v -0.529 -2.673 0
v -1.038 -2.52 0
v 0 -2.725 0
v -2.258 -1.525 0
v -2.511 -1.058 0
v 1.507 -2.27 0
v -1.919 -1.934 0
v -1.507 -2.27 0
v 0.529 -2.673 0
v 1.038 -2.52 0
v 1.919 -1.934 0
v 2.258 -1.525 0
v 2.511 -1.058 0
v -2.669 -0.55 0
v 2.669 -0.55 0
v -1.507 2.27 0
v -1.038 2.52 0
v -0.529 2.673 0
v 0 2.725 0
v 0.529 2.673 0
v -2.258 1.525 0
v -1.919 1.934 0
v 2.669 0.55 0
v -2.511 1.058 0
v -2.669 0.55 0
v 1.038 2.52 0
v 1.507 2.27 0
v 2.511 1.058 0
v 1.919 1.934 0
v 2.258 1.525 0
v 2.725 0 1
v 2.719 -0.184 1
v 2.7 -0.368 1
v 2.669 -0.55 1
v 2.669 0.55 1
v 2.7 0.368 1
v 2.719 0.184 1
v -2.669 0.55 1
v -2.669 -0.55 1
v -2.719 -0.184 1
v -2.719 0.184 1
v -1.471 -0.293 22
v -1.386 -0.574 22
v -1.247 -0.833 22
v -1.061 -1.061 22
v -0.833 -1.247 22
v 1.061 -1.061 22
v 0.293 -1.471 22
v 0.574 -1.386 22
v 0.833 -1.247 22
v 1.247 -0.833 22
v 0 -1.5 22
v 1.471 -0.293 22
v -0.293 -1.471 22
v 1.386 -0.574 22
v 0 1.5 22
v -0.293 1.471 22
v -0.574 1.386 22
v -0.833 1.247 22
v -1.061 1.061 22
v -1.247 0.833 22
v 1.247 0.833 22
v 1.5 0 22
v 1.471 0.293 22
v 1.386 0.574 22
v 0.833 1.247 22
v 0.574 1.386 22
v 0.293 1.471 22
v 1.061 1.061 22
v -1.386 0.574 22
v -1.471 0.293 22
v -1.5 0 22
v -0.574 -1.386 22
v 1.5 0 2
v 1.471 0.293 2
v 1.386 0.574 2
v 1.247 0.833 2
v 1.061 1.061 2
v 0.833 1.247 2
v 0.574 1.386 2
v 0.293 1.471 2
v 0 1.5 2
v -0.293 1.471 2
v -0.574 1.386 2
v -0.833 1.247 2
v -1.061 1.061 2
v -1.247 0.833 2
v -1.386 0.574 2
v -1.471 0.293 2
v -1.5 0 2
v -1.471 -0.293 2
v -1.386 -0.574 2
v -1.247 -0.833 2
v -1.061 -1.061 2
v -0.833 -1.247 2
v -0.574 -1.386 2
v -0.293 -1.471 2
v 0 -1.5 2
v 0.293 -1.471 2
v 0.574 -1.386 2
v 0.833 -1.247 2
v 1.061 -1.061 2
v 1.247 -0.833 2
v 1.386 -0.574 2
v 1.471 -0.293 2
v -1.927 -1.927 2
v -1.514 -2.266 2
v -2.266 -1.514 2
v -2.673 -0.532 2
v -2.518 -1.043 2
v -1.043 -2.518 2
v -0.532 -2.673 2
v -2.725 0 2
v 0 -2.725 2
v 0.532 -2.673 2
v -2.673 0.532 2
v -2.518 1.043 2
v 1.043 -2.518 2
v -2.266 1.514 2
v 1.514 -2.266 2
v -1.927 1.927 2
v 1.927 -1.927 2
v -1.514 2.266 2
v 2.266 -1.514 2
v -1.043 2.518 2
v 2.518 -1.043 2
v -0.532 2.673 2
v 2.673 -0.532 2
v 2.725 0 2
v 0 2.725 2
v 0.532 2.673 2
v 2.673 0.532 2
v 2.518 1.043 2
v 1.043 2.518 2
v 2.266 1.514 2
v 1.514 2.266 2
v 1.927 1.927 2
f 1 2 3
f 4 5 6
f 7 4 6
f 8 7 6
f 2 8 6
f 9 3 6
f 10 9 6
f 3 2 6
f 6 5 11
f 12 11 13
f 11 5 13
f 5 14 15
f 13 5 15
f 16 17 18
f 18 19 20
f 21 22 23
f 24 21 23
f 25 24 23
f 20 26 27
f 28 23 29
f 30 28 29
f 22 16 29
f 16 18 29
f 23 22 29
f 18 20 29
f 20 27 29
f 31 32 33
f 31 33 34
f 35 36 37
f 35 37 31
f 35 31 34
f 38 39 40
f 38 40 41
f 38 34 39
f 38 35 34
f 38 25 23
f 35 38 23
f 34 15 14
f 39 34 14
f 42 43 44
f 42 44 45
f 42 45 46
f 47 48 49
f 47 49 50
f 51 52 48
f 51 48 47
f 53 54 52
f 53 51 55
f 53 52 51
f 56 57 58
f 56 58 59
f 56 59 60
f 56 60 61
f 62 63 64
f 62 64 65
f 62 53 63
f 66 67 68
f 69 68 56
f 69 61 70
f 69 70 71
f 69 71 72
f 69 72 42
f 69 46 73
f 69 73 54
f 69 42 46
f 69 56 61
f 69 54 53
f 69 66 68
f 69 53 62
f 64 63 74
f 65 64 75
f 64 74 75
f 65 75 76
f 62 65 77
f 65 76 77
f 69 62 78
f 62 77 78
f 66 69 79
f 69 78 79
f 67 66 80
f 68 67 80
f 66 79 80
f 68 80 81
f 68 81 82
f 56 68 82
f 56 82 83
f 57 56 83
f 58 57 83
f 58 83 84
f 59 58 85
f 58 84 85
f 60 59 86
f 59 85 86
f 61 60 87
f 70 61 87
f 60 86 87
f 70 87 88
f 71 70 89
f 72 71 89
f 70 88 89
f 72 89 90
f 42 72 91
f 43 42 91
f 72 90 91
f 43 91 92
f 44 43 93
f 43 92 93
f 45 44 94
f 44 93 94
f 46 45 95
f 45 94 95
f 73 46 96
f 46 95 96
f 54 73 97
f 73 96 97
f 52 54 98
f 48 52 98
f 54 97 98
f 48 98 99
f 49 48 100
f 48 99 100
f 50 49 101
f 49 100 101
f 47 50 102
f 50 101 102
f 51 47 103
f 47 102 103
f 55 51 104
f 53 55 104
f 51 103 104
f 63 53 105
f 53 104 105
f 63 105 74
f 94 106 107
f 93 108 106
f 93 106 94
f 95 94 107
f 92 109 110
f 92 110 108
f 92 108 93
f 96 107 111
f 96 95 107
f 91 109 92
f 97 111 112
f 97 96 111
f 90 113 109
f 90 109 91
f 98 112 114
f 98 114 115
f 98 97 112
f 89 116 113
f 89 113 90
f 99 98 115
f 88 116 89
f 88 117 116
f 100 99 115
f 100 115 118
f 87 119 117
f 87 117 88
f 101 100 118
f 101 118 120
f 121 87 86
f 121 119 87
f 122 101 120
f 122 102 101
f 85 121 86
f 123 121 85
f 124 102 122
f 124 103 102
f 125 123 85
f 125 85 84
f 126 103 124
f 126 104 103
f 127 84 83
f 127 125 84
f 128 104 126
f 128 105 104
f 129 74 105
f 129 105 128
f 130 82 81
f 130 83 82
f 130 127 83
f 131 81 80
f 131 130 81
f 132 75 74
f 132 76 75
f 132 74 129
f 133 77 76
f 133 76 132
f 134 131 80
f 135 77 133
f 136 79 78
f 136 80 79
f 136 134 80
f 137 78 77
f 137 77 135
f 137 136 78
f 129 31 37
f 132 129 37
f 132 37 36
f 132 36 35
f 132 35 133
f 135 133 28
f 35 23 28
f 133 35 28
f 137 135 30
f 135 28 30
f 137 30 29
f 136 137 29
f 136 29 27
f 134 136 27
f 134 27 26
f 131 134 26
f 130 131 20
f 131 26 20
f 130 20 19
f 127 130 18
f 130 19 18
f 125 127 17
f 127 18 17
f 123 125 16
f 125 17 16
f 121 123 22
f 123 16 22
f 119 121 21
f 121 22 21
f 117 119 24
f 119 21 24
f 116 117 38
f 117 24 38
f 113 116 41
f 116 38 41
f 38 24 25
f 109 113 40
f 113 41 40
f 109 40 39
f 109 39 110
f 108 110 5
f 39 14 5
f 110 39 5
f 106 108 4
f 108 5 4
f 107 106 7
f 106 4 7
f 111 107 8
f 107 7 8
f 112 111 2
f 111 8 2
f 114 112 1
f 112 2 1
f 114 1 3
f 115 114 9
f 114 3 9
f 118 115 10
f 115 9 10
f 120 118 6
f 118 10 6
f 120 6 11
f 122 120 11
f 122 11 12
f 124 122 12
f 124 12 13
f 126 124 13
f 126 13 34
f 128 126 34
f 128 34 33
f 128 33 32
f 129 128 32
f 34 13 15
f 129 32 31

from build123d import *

# Parameters (mm, degrees)
SKETCH1_R          = 2.725
EXTRUDE1_DEPTH     = 2
CUT_EXTRUDE1_DEPTH = 1
SKETCH3_R          = 1.5
EXTRUDE2_DEPTH     = 20


with BuildPart() as part:
    # Sketch1 → Extrude1 (new body)
    with BuildSketch(Plane.XY):
        Circle(SKETCH1_R)
    extrude(amount=EXTRUDE1_DEPTH)

    # Sketch2 → Cut-Extrude1 (cut)
    with BuildSketch(Plane(origin=(0, 0, 0), x_dir=(-1, 0, 0), z_dir=(0, 0, -1))):
        Polygon((3.449801909, 0), (3.449801909, 0.55), (-3.901269584, 0.55), (-3.901269584, -0.55), (3.449801909, -0.55), align=None)
    extrude(amount=-CUT_EXTRUDE1_DEPTH, mode=Mode.SUBTRACT)

    # Sketch3 → Extrude2 (add)
    with BuildSketch(Plane.XY.offset(2)):
        Circle(SKETCH3_R)
    extrude(amount=EXTRUDE2_DEPTH)


solid = part.part
